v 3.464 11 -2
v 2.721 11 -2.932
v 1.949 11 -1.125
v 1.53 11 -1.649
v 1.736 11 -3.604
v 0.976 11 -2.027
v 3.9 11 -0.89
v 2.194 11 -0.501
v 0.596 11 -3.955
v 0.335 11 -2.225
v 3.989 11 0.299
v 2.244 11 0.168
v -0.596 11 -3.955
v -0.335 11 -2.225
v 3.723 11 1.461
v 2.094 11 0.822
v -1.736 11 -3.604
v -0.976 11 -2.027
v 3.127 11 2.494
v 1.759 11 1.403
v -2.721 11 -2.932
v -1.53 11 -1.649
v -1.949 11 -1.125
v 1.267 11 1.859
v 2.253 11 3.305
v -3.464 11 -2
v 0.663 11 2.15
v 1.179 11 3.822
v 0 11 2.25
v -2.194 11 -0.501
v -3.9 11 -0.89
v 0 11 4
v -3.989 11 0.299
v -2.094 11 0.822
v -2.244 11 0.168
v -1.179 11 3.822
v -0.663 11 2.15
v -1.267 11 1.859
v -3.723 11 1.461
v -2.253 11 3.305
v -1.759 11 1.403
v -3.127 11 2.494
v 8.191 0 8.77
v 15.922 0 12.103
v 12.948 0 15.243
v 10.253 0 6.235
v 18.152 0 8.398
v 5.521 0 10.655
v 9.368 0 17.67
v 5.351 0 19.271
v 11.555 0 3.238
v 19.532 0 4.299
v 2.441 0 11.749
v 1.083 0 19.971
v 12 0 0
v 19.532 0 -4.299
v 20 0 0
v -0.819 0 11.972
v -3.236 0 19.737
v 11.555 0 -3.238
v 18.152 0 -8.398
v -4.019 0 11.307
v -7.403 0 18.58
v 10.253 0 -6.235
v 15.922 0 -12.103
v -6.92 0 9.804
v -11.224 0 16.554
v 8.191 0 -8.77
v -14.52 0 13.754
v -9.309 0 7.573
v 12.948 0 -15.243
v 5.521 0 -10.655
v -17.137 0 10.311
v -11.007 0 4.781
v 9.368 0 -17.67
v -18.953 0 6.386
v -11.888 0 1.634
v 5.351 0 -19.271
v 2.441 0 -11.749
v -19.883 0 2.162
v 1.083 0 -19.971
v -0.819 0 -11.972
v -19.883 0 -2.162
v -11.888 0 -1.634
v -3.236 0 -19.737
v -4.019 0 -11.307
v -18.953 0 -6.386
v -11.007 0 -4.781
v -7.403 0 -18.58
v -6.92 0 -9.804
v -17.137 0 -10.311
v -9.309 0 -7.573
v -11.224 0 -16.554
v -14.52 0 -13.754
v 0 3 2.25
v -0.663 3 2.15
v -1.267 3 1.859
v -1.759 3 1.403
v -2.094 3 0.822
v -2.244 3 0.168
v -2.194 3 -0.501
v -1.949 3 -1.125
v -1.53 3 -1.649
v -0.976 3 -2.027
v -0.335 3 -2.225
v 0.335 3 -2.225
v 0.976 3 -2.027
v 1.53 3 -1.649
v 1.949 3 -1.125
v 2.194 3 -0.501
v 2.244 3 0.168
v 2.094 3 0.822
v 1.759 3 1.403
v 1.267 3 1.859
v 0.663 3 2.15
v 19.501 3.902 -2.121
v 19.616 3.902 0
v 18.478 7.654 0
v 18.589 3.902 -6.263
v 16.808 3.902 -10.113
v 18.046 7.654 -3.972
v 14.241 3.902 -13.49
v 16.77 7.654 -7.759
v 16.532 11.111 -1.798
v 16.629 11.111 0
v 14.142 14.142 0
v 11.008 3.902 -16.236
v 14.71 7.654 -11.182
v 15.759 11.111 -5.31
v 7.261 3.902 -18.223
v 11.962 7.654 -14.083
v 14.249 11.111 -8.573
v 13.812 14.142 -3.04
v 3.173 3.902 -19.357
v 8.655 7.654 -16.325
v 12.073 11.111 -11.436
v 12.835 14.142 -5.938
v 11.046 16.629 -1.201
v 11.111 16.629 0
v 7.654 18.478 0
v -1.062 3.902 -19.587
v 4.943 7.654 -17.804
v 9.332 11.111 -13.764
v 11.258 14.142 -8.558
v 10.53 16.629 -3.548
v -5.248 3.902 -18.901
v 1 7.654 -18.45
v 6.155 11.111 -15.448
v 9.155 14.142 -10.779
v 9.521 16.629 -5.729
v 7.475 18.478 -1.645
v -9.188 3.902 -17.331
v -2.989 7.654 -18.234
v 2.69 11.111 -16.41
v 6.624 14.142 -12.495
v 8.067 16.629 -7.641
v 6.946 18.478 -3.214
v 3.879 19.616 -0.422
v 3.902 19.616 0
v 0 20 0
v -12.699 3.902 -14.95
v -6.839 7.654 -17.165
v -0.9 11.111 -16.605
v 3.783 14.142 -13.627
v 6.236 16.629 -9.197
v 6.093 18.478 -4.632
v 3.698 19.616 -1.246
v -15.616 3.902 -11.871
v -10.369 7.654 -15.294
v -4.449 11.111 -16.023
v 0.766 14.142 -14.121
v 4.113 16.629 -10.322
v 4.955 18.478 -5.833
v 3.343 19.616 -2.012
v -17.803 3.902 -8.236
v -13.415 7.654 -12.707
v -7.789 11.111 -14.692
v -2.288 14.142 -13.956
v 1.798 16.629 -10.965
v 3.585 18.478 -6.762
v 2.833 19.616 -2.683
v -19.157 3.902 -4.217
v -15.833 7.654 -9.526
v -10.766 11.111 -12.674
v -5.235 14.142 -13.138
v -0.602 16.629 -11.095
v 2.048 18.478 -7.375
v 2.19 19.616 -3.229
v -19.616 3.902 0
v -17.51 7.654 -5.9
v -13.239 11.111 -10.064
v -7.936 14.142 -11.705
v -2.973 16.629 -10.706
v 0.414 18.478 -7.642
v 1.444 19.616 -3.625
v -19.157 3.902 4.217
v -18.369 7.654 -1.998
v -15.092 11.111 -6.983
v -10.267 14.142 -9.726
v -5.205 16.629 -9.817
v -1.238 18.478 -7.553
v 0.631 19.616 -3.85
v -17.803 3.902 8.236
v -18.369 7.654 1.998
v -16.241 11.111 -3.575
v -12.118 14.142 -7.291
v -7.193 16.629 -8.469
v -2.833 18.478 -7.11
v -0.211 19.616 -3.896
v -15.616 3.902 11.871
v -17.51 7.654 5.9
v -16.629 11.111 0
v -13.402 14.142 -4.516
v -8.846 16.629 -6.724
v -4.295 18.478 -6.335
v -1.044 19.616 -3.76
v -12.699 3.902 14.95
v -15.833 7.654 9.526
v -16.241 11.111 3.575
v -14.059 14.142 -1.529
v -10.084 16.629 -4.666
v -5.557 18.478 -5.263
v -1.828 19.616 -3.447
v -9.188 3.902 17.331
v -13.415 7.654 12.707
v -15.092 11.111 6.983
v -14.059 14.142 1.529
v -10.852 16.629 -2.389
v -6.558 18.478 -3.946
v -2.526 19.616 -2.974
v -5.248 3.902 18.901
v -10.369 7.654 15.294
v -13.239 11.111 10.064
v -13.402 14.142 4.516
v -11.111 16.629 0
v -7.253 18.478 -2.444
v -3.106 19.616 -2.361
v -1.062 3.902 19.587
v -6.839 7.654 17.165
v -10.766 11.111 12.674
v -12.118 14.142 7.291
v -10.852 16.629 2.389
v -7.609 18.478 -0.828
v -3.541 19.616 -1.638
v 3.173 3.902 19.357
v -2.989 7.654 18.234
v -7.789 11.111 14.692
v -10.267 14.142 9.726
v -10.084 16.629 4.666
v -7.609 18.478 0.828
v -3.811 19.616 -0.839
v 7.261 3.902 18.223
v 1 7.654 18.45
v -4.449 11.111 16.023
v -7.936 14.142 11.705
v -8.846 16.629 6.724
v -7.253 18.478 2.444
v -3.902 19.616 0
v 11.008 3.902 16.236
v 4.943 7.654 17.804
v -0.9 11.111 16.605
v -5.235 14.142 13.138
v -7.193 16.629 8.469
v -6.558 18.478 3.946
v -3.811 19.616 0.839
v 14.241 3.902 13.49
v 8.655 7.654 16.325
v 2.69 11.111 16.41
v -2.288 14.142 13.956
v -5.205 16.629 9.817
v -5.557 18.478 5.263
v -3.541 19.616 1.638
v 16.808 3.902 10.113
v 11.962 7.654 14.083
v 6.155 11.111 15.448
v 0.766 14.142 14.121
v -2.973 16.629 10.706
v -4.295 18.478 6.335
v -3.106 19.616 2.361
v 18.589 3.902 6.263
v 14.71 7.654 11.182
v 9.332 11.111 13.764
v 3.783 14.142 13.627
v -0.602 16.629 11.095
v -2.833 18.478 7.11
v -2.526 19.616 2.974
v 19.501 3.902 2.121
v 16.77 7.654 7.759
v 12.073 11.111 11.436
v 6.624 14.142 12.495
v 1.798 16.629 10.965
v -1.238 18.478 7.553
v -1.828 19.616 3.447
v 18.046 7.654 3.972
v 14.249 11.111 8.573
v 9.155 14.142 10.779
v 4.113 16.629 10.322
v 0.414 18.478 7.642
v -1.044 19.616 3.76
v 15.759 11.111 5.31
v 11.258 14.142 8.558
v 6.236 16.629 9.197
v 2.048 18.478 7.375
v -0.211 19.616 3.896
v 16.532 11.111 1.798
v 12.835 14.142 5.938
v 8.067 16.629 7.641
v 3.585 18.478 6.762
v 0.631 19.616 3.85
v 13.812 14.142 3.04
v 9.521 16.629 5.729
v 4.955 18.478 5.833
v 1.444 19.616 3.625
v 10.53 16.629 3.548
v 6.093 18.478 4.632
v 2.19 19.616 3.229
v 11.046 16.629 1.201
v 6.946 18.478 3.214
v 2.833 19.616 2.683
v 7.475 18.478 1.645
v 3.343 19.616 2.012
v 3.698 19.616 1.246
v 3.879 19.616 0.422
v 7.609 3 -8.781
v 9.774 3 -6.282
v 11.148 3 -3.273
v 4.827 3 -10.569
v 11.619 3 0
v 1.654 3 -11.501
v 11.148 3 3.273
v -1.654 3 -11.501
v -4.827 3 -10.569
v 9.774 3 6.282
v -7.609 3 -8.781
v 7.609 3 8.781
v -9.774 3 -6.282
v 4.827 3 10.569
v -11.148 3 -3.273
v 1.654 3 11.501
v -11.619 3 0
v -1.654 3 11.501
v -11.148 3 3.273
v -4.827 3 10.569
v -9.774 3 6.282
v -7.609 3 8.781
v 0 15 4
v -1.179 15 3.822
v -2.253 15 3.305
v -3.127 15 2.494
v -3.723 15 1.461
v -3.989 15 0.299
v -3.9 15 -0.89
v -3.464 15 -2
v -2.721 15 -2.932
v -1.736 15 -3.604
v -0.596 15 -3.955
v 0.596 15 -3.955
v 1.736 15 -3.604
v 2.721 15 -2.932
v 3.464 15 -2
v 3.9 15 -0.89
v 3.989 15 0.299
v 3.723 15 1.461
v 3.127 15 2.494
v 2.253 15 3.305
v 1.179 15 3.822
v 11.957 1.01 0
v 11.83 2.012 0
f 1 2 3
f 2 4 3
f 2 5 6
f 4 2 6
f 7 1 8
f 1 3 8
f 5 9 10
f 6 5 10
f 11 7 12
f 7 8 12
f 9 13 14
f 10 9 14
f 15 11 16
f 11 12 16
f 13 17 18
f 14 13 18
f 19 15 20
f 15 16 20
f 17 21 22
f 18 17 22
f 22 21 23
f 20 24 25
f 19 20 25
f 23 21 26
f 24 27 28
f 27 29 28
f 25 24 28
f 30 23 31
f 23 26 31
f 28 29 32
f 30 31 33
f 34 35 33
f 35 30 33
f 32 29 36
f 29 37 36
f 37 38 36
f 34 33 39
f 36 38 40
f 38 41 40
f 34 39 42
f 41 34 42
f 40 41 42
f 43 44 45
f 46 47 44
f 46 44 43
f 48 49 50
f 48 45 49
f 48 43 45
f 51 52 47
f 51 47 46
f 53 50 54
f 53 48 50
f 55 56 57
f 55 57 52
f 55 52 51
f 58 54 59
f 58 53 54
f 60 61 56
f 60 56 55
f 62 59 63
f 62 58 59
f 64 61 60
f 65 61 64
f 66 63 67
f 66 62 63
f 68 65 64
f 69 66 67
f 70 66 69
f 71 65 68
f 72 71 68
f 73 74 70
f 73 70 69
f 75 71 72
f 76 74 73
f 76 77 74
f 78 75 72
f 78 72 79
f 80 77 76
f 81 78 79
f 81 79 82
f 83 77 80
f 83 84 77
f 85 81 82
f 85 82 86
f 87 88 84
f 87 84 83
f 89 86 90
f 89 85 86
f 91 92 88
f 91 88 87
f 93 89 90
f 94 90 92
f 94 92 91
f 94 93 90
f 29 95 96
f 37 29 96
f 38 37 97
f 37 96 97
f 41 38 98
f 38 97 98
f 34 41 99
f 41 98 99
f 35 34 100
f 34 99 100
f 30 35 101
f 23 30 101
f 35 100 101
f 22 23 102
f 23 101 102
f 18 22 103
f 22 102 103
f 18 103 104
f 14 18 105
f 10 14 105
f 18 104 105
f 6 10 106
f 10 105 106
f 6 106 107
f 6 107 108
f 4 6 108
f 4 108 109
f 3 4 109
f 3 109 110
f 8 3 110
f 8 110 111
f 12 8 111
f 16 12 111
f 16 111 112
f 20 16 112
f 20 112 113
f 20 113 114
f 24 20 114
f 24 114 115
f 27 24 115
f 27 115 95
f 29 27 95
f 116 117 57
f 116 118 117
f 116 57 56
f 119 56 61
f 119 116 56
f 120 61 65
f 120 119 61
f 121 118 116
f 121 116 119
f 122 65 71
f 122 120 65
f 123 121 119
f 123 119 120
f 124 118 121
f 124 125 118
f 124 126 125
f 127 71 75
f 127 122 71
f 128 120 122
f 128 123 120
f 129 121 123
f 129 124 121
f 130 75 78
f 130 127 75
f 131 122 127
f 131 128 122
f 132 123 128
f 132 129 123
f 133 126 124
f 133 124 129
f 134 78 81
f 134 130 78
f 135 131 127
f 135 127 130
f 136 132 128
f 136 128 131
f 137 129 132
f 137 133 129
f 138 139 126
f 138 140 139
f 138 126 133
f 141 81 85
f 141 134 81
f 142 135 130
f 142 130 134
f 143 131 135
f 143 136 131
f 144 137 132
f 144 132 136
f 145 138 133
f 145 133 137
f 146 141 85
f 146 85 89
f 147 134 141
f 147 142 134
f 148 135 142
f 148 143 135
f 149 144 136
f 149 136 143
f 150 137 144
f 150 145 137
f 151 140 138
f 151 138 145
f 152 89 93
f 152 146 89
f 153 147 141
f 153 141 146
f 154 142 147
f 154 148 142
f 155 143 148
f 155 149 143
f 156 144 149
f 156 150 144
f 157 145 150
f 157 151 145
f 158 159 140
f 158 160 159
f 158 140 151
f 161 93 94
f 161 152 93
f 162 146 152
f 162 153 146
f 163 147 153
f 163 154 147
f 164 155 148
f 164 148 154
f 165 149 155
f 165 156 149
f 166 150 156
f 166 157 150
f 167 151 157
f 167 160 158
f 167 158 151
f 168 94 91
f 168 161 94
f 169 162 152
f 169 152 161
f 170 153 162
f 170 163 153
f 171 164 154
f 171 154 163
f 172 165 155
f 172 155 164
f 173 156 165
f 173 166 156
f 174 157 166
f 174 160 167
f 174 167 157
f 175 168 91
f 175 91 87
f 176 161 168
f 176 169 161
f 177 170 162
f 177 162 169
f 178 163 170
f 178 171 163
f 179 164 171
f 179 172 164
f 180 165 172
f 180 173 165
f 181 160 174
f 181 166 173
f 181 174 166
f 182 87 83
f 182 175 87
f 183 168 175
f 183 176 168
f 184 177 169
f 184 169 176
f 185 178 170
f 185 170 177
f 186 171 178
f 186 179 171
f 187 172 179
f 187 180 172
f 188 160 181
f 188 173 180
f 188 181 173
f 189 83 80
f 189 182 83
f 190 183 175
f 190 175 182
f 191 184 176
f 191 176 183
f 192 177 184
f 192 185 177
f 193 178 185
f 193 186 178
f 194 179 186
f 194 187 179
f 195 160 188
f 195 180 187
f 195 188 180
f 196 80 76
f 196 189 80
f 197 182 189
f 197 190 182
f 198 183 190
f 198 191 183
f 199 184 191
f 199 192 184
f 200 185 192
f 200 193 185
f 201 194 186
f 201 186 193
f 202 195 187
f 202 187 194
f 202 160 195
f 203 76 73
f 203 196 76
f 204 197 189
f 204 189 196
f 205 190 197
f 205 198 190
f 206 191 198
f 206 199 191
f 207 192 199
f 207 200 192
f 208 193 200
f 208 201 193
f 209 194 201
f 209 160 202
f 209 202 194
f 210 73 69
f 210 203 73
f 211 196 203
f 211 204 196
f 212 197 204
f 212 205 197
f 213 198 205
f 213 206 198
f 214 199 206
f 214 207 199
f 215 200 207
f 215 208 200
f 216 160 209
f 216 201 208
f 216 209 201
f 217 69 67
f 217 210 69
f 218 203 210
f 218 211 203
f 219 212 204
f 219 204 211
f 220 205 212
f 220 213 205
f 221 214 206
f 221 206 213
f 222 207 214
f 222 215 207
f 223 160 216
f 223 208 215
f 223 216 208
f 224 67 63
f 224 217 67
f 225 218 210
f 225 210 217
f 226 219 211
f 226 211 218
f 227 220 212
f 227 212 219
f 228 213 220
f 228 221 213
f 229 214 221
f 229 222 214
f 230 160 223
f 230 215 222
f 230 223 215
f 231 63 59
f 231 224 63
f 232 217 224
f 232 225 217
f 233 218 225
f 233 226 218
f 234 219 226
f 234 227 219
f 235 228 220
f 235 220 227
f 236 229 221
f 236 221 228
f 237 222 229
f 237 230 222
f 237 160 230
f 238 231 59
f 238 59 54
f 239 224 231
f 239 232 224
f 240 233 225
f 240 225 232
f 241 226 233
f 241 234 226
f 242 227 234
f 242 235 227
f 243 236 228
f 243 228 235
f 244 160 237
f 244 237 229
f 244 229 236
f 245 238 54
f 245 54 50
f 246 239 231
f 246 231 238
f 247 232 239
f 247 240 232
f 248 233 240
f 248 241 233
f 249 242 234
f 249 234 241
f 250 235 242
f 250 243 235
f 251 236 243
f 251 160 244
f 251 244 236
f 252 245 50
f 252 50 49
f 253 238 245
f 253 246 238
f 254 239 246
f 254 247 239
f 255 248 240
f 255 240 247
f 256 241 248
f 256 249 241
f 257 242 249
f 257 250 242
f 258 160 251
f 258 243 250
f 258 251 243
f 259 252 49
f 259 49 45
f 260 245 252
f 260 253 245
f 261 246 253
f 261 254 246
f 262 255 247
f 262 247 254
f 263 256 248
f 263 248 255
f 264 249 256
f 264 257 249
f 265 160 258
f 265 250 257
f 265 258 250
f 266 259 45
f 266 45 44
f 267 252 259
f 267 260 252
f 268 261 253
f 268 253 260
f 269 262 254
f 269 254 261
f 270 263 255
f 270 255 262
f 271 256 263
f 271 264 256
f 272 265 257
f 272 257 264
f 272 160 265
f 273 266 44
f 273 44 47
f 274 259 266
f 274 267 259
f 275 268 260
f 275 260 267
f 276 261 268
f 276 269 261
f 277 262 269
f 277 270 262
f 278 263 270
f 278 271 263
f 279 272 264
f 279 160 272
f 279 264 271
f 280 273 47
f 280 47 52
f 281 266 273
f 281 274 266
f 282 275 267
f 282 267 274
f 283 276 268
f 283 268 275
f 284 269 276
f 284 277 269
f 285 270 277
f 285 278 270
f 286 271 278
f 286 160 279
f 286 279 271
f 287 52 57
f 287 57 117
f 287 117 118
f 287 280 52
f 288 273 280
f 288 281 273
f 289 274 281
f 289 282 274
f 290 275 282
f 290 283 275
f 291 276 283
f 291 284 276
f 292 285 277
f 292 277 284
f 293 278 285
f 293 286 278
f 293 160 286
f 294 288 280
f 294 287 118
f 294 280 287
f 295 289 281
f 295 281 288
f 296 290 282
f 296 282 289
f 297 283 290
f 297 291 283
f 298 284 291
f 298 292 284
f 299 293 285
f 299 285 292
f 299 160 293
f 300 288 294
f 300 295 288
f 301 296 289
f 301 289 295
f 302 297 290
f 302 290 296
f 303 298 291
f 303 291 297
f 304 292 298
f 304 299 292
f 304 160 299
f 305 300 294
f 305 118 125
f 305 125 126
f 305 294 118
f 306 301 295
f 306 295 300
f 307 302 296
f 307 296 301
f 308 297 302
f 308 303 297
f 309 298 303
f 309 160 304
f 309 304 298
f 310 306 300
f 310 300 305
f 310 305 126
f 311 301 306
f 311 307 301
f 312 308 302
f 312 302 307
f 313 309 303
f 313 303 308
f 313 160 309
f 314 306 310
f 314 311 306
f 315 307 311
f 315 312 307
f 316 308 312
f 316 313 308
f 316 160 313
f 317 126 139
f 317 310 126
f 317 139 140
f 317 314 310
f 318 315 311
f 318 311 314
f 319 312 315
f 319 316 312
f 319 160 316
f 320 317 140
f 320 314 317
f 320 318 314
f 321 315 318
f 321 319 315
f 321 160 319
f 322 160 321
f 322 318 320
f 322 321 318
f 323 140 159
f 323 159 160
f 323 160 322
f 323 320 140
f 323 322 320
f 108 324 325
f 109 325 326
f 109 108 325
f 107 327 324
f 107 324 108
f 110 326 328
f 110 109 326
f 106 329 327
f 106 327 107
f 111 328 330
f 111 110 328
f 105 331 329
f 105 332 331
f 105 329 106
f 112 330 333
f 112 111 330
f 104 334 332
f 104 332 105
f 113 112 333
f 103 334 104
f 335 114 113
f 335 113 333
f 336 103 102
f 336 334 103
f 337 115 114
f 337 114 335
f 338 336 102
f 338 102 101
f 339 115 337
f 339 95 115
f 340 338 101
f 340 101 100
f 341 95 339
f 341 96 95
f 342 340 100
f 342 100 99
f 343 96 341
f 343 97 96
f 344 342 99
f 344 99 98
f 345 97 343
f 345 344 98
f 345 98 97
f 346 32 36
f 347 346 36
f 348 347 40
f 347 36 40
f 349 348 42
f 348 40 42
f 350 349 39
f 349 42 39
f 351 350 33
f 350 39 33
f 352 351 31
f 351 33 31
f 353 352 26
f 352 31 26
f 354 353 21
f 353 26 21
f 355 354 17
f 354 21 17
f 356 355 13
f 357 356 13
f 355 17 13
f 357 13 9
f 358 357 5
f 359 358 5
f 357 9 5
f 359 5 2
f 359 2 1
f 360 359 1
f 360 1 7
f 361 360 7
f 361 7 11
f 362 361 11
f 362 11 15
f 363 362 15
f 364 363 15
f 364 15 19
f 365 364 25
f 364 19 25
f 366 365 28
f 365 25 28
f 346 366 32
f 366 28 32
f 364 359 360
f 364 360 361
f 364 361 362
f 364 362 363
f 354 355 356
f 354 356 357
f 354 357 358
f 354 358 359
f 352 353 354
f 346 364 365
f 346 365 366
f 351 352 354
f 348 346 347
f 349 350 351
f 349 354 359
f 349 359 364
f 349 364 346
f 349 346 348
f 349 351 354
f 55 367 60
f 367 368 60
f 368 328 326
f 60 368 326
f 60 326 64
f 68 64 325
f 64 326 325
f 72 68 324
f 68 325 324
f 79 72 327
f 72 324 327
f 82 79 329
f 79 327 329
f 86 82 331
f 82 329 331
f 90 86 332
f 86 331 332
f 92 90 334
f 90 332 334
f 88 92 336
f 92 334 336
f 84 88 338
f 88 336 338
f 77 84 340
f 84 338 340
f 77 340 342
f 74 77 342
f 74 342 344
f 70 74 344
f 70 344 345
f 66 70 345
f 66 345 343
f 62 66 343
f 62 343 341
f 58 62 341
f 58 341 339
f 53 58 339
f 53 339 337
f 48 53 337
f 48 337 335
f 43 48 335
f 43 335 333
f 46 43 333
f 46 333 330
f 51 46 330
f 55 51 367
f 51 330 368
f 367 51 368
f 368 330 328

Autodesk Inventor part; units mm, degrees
ref_plane "YZ Plane" through (0, 0, 0) normal (1, 0, 0) x (0, 1, 0)
ref_plane "XY Plane" through (0, 0, 0) normal (0, 0, 1) x (1, 0, 0)
sketch "Sketch1" plane through (0, 0, 0) normal (0, 0, 1) x (1, 0, 0)
  line L0 (0, 0) -> (0, 20)
  line L1 (0, 0) -> (20, 0)
  arc A0 (20, 0) -> (0, 20) centre (0, 0) ccw
  line L2 (0, -4.8284) -> (0, 28.9706) projected
  dimension "d2" = 20
revolve "Revolution1" add sketch "Sketch1" angle 360 about axis through (0, -10, 0) along (0, 1, 0)
ref_plane "Work Plane1" through (0, 15, 0) normal (0, 1, 0) x (-1, 0, 0)
sketch "Sketch2" plane through (0, 15, 0) normal (0, 1, 0) x (-1, 0, 0)
  point P0 (0, 0)
  point P1 (0, 0)
hole "Hole1" at (0, 15, 0) direction (0, -1, 0) diameter 4.5 end through all counterbore diameter 8 counterbore depth 4 clearance for "Socket Head Cap Screw" size "M4" standard "Ansi Metric M Profile"
shell "Shell1" thickness 8 removed faces 1 at (13.8841, 0, 1.6858)
sketch "Sketch3" plane through (0, 0, 0) normal (0, -1, 0) x (1, 0, 0)
  circle A0 centre (0, 0) radius 10.25 projected
  circle A1 centre (0, 0) radius 2.25 projected
extrude "Extrusion1" cut sketch "Sketch3" against normal blind 3
properties part number "Ball_Upper Half" material "Nylon 6/6"
